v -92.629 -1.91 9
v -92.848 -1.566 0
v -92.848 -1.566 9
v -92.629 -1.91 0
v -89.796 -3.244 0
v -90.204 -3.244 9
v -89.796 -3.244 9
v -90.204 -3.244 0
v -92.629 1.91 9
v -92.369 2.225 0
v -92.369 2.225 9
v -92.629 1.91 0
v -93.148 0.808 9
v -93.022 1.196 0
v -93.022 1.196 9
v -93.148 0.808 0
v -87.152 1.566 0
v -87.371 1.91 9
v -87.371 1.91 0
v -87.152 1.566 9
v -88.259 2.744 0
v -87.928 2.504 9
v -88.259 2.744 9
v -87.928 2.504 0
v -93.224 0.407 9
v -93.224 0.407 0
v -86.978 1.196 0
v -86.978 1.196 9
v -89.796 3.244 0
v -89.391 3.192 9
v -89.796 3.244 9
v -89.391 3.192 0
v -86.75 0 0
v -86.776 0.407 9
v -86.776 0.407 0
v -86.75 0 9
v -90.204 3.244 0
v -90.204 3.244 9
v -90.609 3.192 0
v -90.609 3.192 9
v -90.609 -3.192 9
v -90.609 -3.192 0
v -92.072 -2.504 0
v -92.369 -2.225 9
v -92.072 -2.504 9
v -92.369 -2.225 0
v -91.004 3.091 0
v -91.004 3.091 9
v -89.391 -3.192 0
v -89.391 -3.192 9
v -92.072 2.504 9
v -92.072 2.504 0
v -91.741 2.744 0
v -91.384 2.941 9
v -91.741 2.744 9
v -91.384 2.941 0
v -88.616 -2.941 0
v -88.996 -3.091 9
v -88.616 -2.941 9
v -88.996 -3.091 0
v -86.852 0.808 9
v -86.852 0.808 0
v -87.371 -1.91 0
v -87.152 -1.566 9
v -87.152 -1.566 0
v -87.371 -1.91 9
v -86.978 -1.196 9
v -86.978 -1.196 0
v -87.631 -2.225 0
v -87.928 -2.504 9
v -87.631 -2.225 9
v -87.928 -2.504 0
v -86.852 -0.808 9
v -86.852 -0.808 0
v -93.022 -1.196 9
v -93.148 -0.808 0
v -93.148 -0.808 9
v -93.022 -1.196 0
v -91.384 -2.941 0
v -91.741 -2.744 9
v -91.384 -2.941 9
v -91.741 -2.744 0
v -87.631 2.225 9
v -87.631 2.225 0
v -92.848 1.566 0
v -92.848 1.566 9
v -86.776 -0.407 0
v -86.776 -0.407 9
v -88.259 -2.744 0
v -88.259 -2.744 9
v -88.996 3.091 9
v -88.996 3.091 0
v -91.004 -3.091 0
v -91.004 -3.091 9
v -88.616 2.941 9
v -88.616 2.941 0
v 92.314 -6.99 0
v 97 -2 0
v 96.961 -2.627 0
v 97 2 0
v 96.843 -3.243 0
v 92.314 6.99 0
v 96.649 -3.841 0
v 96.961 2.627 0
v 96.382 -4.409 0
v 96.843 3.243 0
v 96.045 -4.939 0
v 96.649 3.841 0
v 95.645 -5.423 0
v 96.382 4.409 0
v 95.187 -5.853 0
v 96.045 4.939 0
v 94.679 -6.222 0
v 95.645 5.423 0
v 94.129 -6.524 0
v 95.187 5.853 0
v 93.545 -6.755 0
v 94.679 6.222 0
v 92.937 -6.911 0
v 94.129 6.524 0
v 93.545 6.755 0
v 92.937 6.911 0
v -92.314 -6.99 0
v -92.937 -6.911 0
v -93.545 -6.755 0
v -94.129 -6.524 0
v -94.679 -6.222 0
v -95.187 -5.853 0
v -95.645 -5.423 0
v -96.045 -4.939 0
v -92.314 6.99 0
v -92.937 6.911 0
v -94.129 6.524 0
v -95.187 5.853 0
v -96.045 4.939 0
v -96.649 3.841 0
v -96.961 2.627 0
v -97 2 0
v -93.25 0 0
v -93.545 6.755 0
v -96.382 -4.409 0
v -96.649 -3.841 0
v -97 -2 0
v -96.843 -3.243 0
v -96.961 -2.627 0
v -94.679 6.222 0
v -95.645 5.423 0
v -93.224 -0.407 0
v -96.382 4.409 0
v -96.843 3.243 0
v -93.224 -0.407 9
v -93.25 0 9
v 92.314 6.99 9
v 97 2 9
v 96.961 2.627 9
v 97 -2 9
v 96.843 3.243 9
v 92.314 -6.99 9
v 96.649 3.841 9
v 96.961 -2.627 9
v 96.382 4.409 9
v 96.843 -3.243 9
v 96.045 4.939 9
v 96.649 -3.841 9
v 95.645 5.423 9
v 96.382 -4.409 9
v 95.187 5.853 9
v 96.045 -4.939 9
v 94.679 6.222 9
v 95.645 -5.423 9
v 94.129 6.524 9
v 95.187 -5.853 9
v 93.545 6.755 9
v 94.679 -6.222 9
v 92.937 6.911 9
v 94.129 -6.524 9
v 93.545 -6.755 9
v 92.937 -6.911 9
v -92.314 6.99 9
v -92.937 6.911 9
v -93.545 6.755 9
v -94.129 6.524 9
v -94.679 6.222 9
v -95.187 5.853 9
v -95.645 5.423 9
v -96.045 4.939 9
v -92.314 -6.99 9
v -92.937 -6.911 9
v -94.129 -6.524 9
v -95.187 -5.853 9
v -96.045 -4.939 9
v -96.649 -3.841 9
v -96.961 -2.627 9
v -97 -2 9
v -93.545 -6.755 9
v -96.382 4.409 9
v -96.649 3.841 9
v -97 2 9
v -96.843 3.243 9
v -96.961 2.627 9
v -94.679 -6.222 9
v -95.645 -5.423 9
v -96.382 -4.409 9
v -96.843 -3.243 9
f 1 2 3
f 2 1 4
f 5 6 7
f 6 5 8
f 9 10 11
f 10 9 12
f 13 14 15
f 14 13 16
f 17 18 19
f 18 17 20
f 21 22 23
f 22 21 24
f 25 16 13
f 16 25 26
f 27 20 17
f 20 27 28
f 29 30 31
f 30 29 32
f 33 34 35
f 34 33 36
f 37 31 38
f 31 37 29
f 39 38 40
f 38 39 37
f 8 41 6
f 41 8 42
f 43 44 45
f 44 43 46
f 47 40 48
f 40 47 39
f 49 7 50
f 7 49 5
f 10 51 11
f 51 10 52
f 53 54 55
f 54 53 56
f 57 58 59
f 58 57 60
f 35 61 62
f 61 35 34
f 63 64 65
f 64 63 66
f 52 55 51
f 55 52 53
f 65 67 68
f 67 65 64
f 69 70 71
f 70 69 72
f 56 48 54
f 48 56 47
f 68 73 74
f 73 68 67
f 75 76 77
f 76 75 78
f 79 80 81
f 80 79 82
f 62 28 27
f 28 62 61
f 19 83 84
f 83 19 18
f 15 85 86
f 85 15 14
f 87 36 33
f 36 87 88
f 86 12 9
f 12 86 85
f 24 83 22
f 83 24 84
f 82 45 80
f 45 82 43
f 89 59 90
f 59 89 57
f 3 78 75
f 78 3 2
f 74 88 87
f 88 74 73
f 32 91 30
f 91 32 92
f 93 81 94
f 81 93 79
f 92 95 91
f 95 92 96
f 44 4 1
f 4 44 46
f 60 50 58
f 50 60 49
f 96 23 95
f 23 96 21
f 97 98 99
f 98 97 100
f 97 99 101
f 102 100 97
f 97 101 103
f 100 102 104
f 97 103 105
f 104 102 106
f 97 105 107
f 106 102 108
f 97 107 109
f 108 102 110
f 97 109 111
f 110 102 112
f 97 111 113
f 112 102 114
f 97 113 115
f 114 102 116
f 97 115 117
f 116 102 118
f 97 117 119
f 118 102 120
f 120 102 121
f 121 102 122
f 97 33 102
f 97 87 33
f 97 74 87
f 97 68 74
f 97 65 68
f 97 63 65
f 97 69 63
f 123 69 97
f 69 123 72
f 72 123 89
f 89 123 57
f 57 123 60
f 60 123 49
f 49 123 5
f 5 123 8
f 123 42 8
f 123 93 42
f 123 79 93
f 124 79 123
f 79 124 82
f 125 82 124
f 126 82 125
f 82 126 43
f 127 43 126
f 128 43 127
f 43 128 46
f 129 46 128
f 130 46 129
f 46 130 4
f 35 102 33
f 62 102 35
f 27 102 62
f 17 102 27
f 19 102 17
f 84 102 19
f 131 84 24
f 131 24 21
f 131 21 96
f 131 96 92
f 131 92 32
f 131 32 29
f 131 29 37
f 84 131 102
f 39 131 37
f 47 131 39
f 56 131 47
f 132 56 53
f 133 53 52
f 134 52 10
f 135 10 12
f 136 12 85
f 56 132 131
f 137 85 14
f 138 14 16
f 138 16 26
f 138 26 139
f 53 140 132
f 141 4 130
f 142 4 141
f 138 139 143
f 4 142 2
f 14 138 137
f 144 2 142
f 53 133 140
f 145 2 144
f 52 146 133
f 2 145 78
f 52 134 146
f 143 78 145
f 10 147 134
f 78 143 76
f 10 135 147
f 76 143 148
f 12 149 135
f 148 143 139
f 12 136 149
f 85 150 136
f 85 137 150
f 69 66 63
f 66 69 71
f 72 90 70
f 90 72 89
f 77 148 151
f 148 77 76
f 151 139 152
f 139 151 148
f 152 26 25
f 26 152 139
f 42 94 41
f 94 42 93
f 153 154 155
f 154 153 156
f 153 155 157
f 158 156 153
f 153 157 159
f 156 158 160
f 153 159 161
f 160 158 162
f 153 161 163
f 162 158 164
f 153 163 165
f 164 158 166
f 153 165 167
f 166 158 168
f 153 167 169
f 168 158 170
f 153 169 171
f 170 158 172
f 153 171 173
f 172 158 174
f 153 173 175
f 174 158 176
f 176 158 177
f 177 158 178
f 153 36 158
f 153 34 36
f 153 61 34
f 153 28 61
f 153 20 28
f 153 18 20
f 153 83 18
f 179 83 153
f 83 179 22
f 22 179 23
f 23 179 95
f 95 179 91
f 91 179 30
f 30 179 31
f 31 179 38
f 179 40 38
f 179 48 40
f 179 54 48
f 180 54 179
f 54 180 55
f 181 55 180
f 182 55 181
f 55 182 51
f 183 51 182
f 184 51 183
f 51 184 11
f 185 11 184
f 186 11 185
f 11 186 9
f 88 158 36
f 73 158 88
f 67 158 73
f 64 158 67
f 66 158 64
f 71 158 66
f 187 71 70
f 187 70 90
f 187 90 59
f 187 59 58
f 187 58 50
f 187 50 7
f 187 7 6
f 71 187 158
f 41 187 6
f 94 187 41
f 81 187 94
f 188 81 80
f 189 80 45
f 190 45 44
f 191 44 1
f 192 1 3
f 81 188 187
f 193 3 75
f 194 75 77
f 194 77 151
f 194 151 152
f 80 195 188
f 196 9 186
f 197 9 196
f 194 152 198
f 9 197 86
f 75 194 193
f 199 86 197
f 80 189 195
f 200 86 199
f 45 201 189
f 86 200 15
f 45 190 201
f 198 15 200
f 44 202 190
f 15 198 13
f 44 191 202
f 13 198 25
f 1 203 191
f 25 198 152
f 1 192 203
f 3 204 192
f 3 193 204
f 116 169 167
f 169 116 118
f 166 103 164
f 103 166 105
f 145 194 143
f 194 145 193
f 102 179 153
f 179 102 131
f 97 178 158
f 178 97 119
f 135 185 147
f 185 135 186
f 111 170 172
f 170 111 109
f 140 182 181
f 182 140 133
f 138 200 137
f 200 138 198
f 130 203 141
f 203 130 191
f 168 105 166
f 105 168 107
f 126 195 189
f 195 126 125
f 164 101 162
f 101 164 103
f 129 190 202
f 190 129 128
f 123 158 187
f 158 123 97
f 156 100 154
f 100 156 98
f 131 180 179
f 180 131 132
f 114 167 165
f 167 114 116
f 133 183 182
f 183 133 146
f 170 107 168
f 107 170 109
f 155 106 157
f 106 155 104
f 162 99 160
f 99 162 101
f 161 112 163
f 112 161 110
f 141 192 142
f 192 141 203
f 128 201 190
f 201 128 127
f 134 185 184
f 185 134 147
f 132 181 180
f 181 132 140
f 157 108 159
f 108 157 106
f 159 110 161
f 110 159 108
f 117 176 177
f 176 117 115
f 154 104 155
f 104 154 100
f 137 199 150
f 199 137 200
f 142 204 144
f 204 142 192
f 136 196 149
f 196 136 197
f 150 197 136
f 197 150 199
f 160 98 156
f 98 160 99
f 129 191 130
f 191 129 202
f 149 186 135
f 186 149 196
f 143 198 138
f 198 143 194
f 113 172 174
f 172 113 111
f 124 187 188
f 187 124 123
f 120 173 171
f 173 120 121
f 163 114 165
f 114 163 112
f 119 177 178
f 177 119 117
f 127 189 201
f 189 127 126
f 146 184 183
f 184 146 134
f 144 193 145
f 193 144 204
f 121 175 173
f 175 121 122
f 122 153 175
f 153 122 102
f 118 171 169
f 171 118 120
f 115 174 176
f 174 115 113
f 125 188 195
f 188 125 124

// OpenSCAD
$fn = 50;


difference() {
	union() {
		hull() {
			translate(v = [-92.0000000000, 2.0000000000, 0]) {
				cylinder(h = 9, r = 5);
			}
			translate(v = [92.0000000000, 2.0000000000, 0]) {
				cylinder(h = 9, r = 5);
			}
			translate(v = [-92.0000000000, -2.0000000000, 0]) {
				cylinder(h = 9, r = 5);
			}
			translate(v = [92.0000000000, -2.0000000000, 0]) {
				cylinder(h = 9, r = 5);
			}
		}
	}
	union() {
		translate(v = [-90.0000000000, 0.0000000000, 0]) {
			cylinder(h = 9, r = 3.2500000000);
		}
		translate(v = [-90.0000000000, 0.0000000000, 0]) {
			cylinder(h = 9, r = 1.8000000000);
		}
		translate(v = [-90.0000000000, 0.0000000000, 0]) {
			cylinder(h = 9, r = 1.8000000000);
		}
		translate(v = [-90.0000000000, 0.0000000000, 0]) {
			cylinder(h = 9, r = 1.8000000000);
		}
	}
}
